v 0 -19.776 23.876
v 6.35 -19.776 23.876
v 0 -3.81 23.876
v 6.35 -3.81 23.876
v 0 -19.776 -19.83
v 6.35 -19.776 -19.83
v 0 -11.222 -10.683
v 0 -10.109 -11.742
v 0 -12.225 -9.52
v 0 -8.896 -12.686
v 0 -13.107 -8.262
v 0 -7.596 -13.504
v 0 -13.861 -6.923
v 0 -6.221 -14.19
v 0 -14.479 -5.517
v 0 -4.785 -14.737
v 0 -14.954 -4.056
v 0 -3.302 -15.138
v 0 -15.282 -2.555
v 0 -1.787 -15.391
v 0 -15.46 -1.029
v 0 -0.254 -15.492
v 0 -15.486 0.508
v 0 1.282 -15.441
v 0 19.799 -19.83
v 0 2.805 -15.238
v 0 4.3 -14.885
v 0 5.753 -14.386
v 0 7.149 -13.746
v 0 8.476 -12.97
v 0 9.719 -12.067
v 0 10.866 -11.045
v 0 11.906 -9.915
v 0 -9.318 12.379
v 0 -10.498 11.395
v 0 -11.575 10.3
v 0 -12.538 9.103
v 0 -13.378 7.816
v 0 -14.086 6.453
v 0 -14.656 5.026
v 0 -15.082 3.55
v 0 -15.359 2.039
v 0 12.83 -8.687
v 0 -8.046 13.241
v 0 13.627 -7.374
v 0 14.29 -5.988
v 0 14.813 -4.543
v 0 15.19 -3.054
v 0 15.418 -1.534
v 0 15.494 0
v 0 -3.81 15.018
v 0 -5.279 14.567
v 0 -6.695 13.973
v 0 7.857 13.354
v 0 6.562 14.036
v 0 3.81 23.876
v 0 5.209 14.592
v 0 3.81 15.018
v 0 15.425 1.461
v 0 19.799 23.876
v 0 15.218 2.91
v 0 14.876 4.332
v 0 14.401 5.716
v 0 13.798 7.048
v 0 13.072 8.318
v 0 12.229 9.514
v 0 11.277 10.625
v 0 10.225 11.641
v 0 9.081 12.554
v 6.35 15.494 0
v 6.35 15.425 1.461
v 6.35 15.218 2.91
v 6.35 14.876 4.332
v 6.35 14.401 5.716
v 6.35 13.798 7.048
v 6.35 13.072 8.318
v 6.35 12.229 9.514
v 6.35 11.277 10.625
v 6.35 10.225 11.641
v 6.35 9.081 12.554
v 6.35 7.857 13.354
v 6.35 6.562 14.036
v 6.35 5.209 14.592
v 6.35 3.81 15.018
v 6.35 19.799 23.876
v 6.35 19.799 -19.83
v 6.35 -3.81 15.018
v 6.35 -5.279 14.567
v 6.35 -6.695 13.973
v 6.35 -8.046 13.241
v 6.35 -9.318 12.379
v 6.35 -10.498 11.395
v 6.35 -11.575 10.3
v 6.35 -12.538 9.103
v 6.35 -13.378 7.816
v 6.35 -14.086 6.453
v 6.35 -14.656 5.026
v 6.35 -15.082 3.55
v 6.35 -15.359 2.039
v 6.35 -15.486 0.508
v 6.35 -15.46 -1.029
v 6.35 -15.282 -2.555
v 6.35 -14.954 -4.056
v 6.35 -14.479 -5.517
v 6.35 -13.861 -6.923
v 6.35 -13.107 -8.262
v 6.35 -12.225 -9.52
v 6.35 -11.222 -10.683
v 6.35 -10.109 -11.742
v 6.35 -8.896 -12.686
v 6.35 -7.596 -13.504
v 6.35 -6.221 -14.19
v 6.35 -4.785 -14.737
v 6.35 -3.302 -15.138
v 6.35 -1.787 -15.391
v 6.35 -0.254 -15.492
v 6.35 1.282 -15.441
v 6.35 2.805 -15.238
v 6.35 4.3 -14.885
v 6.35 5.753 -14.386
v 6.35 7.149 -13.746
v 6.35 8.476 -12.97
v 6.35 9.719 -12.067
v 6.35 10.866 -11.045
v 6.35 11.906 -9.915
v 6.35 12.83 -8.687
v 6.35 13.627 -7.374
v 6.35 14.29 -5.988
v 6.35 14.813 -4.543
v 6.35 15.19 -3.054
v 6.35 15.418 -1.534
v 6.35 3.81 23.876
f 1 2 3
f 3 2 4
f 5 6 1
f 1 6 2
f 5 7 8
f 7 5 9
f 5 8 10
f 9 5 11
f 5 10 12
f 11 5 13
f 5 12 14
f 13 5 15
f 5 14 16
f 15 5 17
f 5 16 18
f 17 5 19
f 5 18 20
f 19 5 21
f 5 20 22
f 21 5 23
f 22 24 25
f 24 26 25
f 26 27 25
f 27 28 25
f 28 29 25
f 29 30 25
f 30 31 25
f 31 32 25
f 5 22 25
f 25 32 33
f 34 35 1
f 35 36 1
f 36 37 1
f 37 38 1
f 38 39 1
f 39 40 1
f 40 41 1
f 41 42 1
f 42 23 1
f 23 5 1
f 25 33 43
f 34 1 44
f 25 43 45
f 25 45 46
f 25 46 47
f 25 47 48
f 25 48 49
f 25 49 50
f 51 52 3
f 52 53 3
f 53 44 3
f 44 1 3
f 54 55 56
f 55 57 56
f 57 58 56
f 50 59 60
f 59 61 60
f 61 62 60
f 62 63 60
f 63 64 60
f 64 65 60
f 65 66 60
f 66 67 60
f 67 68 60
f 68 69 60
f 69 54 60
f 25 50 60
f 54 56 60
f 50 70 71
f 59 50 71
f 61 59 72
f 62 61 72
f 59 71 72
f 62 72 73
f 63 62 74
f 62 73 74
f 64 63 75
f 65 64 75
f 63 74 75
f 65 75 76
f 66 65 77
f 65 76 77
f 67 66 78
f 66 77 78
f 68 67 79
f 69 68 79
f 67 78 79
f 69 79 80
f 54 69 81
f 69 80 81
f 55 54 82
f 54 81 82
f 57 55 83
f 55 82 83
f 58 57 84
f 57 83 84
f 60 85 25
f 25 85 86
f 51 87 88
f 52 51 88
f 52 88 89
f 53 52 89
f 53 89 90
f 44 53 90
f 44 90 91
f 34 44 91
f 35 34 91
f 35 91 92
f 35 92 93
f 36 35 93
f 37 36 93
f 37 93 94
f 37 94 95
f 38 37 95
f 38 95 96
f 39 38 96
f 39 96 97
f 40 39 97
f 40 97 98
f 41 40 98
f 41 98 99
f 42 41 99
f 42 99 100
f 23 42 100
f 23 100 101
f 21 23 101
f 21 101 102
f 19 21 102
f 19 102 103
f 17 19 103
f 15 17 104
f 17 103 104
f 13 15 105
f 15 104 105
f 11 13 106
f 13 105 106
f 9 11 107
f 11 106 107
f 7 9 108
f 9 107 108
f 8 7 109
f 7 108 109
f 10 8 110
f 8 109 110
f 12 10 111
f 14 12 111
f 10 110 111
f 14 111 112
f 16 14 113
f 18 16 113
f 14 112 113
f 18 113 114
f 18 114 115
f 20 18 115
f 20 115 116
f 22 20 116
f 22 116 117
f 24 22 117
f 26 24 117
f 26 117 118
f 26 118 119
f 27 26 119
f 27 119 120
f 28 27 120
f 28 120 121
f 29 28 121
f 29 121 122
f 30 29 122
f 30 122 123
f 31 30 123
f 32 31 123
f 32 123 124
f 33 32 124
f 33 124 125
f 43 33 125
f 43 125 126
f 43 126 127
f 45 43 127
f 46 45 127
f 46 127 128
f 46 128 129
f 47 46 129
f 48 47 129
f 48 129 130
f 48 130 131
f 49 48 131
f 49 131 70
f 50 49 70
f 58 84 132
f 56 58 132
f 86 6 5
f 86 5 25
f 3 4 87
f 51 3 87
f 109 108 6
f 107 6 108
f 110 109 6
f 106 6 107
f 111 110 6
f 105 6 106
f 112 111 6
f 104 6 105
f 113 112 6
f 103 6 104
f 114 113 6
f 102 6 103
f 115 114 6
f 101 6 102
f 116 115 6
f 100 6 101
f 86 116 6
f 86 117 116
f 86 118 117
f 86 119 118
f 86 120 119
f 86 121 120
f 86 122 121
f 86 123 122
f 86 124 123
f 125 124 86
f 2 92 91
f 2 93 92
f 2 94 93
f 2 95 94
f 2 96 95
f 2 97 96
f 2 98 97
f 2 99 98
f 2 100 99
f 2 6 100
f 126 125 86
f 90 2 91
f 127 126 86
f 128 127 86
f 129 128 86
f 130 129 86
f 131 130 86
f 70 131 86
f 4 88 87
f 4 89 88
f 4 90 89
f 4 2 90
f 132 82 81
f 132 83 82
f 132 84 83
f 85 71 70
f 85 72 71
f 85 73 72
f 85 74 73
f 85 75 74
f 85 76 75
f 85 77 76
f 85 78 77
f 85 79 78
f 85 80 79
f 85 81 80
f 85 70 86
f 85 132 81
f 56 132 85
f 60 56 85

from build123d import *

# Parameters (mm, degrees)
F0_W     = 60.96
F0_H     = 63.5
F1_DEPTH = 6.35
F3_DEPTH = 6.351
F6_DEPTH = 6.351
F7_W     = 39.5752452314
F7_H     = 11.9200152457
F8_DEPTH = 6.351


# Not quite as in the source:
# - a feature of the source that left no trace in its solid (it failed there, or was rolled back) is left out


with BuildPart() as f1:
    # F0 (on Right) → F1 (new body)
    with BuildSketch(Plane.YZ):
        Rectangle(F0_W, F0_H)
    extrude(amount=F1_DEPTH)

    # F2 (on face) → F3 (cut, through all)
    with BuildSketch(Plane.YZ.offset(6.35)):
        with BuildLine():
            ThreePointArc((-3.81, 15.0182534271), (-9.5139869666, -12.2289855671), (15.494, 0))
            ThreePointArc((15.494, 0), (12.2289855671, 9.5139869666), (3.81, 15.0182534271))
            Line((3.81, 15.0182534271), (-3.81, 15.0182534271))
        make_face()
        with BuildLine():
            Line((-3.81, 15.0182534271), (3.81, 15.0182534271))
            ThreePointArc((3.81, 15.0182534271), (0, 15.494), (-3.81, 15.0182534271))
        make_face()
        with BuildLine():
            ThreePointArc((-3.81, 15.0182534271), (0, 15.494), (3.81, 15.0182534271))
            Line((3.81, 15.0182534271), (3.81, 24.1368534271))
            Line((3.81, 24.1368534271), (-3.81, 24.1368534271))
            Line((-3.81, 24.1368534271), (-3.81, 15.0182534271))
        make_face()
    extrude(amount=-F3_DEPTH, mode=Mode.SUBTRACT)

    # F5 (on face) → F6 (cut, through all)
    with BuildSketch(Plane.YZ.offset(6.35)):
        Polygon((30.48, 31.75), (-30.48, 31.75), (-30.48, 23.876), (-3.81, 23.876), (-3.81, 24.1368534271), (3.81, 24.1368534271), (3.81, 23.876), (30.48, 23.876), align=None)
    extrude(amount=-F6_DEPTH, mode=Mode.SUBTRACT)

    # F7 (on face) → F8 (cut, through all)
    with BuildSketch(Plane.YZ.offset(6.35)):
        Polygon((-19.7760853916, 23.876), (-30.48, 23.876), (-30.48, -31.75), (-19.7760853916, -31.75), (-19.7760853916, -19.8299847543), align=None)
        Polygon((19.7991598397, 23.876), (19.7991598397, -19.8299847543), (19.7991598397, -31.75), (30.48, -31.75), (30.48, 23.876), align=None)
        with Locations((0.0115372241, -25.7899923772)):
            Rectangle(F7_W, F7_H)
    extrude(amount=-F8_DEPTH, mode=Mode.SUBTRACT)


solid = f1.part
